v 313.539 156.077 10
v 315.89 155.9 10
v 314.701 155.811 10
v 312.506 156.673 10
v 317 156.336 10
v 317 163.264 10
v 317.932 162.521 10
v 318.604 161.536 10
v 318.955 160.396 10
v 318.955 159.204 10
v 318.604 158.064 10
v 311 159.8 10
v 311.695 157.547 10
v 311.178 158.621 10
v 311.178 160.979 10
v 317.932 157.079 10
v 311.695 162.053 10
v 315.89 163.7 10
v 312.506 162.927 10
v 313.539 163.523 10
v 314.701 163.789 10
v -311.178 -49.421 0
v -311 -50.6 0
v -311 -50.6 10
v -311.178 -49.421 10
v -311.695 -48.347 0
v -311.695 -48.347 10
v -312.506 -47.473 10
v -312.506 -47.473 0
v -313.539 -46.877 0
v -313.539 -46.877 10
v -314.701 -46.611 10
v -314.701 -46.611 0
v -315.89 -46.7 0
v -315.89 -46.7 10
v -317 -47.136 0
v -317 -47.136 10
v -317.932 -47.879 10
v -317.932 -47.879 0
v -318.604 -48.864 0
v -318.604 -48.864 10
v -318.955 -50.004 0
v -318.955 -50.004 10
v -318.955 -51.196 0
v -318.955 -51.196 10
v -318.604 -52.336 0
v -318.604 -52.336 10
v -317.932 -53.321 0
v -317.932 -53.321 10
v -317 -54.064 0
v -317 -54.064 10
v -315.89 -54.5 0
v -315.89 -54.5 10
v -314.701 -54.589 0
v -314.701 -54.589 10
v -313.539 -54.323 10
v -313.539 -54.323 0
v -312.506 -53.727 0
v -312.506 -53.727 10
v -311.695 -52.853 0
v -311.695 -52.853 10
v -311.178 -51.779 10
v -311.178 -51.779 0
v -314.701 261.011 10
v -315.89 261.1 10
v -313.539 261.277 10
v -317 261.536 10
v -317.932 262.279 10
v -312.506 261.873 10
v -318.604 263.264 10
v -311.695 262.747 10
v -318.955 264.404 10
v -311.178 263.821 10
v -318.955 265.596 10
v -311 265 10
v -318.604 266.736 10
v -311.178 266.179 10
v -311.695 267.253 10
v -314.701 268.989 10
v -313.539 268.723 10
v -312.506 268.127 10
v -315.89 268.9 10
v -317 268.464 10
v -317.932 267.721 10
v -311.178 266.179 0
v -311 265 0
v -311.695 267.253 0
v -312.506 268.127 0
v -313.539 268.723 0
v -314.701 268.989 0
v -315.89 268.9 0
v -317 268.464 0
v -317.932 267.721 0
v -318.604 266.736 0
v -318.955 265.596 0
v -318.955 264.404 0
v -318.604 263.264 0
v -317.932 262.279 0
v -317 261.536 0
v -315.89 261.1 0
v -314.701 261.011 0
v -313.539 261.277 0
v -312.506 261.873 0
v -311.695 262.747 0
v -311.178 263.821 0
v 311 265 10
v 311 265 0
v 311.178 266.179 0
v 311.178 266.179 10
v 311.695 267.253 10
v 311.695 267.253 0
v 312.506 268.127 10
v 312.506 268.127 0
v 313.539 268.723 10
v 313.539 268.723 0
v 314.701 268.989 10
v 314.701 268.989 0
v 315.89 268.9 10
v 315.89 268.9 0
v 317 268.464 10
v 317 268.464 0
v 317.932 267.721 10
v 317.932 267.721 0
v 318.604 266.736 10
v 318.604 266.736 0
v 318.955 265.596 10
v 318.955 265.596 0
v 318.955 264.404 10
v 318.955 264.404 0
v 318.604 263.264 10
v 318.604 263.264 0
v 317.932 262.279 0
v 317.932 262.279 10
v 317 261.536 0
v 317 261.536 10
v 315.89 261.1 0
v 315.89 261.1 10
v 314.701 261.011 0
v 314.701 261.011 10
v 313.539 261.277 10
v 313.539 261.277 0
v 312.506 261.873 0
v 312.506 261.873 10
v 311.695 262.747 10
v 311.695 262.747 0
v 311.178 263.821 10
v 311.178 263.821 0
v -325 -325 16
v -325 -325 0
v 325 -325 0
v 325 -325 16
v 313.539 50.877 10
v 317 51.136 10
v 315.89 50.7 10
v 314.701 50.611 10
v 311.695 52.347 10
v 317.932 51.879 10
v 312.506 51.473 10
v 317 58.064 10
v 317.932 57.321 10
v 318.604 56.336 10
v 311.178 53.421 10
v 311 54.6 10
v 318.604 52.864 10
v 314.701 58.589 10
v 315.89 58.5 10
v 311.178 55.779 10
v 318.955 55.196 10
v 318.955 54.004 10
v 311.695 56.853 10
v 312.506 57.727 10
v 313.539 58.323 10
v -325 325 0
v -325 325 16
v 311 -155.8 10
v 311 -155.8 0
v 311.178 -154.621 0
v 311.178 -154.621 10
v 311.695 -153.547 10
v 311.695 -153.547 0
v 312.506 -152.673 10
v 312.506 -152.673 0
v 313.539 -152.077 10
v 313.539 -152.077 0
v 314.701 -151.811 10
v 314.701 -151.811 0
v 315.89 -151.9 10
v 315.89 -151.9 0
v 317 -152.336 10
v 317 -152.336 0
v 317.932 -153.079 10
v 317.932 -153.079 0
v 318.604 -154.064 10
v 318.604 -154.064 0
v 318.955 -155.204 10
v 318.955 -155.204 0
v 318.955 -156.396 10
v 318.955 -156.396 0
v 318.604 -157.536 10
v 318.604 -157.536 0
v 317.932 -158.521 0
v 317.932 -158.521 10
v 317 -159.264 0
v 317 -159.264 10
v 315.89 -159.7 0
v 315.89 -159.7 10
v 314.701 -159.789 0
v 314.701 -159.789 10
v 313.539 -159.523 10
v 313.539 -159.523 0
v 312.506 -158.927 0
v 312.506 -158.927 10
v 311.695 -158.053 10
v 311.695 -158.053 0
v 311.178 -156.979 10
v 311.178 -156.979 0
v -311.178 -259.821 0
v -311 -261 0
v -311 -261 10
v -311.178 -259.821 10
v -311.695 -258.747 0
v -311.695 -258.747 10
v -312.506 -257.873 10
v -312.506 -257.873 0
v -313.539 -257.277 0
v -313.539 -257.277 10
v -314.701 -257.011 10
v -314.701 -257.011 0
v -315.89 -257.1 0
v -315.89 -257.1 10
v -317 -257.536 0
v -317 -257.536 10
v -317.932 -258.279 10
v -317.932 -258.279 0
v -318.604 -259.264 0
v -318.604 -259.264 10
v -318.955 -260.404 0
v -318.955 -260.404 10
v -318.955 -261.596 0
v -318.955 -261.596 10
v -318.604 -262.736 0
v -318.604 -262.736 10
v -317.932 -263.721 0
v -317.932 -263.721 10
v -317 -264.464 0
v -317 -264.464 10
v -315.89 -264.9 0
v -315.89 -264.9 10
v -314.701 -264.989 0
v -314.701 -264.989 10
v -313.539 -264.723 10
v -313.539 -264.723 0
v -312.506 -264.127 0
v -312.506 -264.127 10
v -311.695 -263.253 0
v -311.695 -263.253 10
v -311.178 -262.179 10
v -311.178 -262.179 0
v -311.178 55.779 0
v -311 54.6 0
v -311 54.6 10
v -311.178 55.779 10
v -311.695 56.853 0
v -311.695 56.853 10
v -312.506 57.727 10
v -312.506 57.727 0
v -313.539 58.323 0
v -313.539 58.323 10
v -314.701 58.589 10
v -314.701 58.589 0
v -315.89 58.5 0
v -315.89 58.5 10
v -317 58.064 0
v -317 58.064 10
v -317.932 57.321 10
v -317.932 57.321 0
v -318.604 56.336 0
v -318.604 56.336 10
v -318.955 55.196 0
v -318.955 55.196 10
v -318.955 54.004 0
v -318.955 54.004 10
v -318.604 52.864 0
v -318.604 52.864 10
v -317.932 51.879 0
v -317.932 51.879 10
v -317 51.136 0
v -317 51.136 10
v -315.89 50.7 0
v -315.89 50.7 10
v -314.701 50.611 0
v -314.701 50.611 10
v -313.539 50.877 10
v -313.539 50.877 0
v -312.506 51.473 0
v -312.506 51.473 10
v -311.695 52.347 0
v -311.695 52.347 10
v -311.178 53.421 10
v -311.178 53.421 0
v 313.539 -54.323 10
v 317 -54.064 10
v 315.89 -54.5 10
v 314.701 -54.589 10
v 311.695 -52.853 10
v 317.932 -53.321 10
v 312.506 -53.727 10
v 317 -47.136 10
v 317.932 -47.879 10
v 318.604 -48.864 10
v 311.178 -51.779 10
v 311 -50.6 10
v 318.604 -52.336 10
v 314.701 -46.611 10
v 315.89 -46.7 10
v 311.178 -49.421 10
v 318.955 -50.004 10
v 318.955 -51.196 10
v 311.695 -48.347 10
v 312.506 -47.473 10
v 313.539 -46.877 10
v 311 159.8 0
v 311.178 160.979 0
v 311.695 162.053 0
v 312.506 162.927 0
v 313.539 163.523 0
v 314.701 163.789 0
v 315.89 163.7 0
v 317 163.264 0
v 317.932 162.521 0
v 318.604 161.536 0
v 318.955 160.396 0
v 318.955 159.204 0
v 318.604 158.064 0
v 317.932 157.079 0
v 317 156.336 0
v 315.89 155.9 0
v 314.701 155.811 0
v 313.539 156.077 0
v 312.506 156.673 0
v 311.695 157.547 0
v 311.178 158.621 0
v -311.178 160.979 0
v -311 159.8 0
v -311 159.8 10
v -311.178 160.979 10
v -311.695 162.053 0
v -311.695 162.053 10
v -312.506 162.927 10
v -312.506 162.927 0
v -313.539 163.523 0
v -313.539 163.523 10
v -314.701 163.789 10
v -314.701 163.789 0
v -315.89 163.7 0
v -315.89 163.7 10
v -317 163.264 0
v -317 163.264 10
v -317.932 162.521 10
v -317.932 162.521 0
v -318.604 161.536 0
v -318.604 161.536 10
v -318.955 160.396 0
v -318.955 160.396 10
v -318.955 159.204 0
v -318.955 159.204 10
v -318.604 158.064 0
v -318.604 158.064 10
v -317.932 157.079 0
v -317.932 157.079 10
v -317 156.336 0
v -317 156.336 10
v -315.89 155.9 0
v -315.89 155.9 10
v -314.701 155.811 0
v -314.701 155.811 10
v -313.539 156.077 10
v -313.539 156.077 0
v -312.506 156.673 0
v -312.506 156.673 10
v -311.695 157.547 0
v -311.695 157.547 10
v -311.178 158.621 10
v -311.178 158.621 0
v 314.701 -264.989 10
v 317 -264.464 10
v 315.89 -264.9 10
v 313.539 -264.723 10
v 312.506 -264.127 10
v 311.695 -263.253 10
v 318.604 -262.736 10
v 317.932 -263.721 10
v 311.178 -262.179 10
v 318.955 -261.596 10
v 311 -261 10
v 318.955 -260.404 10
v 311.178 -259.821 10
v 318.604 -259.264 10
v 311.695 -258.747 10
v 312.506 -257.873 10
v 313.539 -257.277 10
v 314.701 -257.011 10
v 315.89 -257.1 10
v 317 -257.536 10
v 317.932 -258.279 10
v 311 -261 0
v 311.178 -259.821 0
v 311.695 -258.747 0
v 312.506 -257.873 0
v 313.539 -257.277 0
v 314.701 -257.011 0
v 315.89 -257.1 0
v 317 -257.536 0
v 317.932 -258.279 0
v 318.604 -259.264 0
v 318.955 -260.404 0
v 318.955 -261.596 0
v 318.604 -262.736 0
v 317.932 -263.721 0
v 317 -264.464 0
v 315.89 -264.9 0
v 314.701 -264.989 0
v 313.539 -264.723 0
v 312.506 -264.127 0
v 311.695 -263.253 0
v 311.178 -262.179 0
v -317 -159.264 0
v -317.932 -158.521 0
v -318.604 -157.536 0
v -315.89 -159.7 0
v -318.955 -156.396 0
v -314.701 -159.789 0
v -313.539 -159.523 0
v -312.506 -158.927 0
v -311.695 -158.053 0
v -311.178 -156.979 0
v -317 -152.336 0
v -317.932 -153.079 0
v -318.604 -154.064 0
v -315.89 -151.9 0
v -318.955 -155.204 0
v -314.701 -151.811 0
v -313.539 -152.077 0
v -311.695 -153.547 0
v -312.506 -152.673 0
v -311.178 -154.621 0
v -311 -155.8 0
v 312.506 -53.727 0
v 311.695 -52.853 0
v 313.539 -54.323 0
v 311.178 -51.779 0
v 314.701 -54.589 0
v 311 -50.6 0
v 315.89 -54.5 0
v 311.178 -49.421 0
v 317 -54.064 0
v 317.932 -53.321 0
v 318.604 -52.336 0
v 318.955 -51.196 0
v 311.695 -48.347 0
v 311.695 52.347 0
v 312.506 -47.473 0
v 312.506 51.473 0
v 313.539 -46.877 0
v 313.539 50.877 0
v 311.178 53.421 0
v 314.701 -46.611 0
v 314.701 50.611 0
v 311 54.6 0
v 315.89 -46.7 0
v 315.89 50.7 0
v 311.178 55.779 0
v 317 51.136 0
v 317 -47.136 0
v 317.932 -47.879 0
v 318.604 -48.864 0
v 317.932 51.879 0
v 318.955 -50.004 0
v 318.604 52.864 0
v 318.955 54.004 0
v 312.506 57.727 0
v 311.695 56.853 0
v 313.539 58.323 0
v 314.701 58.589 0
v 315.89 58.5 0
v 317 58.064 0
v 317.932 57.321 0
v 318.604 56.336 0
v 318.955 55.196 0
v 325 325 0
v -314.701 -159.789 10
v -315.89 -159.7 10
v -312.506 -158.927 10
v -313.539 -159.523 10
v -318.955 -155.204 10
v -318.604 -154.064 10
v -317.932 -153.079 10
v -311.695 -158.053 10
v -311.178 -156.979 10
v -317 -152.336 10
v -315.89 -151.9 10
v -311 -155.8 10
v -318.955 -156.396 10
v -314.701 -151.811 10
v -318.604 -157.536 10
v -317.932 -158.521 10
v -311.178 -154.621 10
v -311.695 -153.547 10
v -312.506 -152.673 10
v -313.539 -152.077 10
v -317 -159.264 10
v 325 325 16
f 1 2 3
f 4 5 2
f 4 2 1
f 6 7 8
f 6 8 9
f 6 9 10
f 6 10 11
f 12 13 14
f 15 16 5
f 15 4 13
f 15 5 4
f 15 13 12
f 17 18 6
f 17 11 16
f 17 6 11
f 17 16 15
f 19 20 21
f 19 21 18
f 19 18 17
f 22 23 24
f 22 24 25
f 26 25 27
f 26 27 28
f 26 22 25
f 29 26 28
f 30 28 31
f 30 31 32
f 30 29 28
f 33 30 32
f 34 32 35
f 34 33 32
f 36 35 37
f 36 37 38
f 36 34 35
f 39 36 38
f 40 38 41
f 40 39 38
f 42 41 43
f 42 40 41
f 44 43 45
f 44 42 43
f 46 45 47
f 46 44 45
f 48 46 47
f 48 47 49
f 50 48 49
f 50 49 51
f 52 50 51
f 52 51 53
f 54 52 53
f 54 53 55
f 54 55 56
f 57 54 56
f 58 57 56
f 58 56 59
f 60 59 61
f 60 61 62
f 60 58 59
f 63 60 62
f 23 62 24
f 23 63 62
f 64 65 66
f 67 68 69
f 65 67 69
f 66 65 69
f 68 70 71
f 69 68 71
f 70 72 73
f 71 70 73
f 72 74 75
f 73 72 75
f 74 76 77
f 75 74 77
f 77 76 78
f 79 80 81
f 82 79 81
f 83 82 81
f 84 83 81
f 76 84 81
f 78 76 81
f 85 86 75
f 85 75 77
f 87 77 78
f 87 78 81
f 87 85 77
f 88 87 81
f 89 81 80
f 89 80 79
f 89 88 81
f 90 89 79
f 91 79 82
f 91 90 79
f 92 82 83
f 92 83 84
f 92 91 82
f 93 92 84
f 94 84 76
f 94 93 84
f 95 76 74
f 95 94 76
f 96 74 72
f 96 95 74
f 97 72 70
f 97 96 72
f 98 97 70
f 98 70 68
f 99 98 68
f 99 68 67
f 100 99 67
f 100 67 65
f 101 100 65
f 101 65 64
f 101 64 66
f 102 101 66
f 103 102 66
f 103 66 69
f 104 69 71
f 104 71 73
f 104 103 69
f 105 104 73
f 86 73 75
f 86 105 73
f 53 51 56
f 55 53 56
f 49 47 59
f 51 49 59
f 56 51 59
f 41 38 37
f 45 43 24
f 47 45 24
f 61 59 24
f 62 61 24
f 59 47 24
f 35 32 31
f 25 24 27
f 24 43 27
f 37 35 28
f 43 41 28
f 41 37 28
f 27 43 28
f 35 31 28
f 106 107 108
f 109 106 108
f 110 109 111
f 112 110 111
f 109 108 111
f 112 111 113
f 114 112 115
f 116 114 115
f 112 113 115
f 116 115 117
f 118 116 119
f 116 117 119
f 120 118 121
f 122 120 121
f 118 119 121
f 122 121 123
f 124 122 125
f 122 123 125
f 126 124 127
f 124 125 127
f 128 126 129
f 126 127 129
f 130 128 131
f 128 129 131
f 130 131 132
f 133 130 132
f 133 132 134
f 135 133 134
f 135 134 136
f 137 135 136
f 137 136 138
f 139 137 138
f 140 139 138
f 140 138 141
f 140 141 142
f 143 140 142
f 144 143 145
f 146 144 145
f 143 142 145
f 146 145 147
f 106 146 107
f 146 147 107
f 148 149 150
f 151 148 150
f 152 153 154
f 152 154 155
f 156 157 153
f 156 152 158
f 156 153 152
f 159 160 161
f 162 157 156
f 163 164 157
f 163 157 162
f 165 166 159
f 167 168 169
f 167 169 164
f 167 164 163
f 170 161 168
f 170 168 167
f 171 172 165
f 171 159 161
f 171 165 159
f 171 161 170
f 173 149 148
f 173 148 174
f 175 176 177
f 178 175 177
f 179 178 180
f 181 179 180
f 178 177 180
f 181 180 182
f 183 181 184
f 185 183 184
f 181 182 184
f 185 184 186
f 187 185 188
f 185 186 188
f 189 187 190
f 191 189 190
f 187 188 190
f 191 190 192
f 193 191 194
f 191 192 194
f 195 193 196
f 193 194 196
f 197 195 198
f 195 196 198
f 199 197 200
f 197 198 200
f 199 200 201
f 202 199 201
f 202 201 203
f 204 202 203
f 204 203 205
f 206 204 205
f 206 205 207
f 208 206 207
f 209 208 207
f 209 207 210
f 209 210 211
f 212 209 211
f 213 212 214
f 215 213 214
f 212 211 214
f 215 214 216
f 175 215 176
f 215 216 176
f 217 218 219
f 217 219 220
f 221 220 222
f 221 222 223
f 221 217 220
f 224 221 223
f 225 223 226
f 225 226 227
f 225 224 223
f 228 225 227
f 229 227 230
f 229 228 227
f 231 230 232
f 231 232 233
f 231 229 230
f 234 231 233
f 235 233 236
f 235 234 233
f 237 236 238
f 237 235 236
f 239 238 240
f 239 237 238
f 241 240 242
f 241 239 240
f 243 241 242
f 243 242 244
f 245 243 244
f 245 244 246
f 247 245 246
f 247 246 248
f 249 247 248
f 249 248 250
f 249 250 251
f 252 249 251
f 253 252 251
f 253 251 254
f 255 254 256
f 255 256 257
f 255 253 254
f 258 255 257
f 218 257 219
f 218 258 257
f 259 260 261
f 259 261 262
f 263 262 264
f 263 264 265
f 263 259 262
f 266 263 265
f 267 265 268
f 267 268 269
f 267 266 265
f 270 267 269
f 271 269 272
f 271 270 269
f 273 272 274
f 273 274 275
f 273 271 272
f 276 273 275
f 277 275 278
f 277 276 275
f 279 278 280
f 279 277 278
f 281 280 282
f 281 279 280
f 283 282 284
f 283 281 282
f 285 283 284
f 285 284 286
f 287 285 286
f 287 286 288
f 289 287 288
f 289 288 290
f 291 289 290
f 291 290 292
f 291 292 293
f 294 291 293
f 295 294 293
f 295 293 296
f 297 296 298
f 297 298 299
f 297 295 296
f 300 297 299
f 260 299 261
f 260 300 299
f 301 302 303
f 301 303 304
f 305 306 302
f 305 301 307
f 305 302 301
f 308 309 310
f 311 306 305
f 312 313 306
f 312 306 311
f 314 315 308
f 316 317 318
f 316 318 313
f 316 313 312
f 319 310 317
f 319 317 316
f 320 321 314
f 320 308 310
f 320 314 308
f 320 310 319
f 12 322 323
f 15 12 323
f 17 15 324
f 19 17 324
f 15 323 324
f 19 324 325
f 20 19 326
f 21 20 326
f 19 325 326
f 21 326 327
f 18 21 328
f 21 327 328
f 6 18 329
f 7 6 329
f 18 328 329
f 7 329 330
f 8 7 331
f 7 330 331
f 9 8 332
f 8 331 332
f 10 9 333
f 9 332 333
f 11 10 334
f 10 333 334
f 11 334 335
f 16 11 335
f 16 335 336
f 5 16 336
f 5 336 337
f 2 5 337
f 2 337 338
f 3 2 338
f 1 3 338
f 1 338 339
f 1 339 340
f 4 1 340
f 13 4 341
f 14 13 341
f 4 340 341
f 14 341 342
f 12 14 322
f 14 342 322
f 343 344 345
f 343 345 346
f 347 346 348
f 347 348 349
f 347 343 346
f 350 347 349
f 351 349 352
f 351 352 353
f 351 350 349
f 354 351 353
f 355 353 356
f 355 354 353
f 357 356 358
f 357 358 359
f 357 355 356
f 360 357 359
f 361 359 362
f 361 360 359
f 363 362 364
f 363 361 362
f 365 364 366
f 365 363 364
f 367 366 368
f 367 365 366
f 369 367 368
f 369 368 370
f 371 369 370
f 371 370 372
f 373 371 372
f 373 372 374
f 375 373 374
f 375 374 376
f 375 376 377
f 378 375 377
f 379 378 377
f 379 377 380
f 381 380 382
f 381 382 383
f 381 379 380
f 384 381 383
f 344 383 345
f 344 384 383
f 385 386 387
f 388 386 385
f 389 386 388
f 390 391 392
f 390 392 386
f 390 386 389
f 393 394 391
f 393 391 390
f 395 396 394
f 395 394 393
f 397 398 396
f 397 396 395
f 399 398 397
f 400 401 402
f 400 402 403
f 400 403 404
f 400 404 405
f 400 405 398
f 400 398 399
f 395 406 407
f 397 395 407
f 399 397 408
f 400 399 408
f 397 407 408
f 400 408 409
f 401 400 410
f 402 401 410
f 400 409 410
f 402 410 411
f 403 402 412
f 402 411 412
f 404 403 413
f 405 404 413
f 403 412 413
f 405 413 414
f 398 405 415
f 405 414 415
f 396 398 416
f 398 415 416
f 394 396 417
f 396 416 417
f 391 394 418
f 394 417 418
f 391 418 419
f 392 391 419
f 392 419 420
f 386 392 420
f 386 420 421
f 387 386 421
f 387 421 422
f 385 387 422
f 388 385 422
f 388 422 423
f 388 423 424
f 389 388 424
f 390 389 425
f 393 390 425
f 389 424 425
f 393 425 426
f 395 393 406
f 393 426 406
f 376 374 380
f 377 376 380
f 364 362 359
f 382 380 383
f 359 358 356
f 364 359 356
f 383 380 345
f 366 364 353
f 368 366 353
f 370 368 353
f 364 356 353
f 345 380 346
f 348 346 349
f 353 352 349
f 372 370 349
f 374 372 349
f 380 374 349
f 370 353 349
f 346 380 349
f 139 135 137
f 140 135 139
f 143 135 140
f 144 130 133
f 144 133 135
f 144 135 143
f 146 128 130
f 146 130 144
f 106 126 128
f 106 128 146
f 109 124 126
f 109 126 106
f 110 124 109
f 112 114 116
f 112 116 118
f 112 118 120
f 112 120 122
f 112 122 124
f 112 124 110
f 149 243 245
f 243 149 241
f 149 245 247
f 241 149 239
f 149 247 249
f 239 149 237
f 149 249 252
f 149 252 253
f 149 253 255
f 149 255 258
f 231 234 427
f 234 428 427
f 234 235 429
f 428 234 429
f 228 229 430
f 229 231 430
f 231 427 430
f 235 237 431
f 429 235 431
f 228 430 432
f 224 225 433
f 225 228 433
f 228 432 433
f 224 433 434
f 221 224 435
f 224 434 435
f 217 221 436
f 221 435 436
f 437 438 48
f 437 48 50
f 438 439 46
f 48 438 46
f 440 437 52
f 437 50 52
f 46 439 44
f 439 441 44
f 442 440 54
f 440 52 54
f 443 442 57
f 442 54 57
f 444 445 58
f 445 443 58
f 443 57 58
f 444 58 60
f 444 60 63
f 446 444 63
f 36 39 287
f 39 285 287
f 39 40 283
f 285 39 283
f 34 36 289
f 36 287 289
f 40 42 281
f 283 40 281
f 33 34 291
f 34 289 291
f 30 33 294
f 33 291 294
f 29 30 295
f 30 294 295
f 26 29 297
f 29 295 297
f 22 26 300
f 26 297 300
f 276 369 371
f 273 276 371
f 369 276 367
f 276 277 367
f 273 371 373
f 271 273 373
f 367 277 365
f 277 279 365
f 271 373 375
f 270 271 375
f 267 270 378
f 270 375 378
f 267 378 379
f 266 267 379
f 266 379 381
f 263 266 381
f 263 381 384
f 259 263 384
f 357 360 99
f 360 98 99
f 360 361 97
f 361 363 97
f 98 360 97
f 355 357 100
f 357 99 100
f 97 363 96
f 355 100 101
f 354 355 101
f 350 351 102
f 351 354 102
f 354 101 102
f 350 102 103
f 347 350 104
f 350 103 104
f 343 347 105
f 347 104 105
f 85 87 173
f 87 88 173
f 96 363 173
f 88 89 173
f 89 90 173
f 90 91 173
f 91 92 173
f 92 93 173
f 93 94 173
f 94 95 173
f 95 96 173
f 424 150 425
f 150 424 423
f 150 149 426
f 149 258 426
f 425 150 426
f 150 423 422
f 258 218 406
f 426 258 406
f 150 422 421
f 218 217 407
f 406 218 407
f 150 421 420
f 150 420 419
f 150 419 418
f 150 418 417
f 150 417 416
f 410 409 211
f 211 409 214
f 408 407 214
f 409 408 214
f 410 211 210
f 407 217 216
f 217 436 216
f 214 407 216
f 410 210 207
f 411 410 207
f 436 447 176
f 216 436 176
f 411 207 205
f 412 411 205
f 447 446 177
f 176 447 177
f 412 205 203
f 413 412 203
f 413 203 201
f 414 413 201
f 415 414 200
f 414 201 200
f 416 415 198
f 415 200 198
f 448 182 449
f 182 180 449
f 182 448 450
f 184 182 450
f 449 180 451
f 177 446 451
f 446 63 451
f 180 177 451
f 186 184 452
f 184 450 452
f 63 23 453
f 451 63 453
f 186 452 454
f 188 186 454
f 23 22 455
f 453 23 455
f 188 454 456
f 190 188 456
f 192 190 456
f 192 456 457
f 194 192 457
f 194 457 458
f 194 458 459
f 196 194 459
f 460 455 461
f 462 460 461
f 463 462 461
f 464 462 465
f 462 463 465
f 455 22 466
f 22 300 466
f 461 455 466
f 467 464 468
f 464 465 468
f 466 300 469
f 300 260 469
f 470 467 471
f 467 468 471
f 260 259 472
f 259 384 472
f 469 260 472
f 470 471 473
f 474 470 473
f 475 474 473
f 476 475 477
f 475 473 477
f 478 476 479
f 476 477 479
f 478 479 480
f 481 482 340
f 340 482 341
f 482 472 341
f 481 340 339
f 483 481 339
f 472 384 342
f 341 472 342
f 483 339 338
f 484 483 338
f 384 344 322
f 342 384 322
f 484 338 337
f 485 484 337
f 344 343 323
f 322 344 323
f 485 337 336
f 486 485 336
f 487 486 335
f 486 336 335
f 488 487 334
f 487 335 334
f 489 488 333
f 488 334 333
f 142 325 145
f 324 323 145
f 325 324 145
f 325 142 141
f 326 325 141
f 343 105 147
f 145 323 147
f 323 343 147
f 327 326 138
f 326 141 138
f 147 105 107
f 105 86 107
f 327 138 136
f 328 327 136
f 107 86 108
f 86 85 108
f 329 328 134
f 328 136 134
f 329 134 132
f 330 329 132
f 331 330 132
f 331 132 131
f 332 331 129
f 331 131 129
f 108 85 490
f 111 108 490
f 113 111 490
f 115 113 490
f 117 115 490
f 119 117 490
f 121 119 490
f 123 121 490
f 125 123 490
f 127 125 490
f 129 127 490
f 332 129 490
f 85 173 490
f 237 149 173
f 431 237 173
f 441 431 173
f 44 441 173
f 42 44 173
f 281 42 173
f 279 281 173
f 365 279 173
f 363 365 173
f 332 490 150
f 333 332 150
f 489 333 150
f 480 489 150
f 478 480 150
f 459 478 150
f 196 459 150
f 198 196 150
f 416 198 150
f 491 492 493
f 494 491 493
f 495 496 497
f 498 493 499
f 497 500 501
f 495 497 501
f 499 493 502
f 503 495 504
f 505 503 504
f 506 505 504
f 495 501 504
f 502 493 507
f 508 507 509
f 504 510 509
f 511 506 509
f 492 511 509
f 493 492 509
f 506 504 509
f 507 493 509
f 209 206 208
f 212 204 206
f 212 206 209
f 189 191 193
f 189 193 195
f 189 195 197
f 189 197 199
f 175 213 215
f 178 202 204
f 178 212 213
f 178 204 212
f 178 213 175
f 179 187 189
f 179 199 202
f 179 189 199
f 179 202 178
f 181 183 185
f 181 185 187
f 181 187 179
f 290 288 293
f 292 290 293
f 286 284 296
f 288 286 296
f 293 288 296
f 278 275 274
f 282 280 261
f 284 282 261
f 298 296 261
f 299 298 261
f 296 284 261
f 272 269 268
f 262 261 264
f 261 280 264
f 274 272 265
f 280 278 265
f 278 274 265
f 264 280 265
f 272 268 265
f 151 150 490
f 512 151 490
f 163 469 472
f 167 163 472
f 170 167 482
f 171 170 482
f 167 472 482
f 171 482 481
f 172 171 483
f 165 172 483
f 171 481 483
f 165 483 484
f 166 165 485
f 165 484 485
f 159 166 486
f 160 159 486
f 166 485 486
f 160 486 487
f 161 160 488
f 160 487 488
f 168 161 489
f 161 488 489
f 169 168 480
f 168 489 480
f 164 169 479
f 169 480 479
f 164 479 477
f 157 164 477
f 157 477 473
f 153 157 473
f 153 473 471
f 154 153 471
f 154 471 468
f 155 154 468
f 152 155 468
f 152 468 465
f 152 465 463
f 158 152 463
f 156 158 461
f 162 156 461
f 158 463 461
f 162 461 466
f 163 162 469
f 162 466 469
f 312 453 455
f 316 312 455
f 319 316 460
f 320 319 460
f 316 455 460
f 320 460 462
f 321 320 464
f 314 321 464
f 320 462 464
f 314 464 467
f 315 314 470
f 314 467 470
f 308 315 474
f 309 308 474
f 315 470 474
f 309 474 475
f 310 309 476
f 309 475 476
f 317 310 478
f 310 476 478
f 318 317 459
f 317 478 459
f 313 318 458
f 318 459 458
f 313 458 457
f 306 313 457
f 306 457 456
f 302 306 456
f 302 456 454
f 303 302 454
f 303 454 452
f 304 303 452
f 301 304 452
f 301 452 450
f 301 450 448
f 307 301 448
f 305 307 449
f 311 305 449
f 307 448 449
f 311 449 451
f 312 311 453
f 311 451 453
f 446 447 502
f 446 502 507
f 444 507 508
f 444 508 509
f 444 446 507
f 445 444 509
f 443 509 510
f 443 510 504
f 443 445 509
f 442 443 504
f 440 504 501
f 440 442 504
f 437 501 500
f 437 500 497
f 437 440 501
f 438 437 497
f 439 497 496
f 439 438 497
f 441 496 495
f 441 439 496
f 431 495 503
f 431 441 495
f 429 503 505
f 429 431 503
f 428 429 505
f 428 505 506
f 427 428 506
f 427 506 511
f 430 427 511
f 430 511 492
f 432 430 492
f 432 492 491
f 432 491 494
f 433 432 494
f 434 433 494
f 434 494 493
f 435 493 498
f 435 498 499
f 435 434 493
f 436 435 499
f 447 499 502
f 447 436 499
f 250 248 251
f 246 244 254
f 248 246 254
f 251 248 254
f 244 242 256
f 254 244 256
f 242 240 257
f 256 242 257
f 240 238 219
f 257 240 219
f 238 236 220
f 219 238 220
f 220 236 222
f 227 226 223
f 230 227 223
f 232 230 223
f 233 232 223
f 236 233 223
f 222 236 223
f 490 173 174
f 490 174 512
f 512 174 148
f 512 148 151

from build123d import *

# Parameters (mm, degrees)
F0_W     = 650
F0_H     = 650
F0_R     = 4
F1_DEPTH = 16
F2_DEPTH = 10


# Not quite as in the source:
# - a pattern or mirror of a feature is missing from the dataset's text; its kind, count and spacing are read off the source's solid


with BuildPart() as f1:
    # F0 (on Top) → F1 (new body)
    with BuildSketch(Plane.XY):
        Rectangle(F0_W, F0_H)
        with Locations((-315, -261)):
            Circle(F0_R, mode=Mode.SUBTRACT)
        with Locations((-315, -155.8)):
            Circle(F0_R, mode=Mode.SUBTRACT)
        with Locations((-315, -50.6)):
            Circle(F0_R, mode=Mode.SUBTRACT)
        with Locations((-315, 54.6)):
            Circle(F0_R, mode=Mode.SUBTRACT)
        with Locations((-315, 159.8)):
            Circle(F0_R, mode=Mode.SUBTRACT)
        with Locations((-315, 265)):
            Circle(F0_R, mode=Mode.SUBTRACT)
        with Locations((-315, 265)):
            Circle(F0_R)
        with Locations((-315, 159.8)):
            Circle(F0_R)
        with Locations((-315, 54.6)):
            Circle(F0_R)
        with Locations((-315, -50.6)):
            Circle(F0_R)
        with Locations((-315, -155.8)):
            Circle(F0_R)
        with Locations((-315, -261)):
            Circle(F0_R)
    extrude(amount=F1_DEPTH)

    # F0 (on Top) → F2 (cut)
    with BuildSketch(Plane.XY):
        with Locations((-315, 265)):
            Circle(F0_R)
        with Locations((-315, 159.8)):
            Circle(F0_R)
        with Locations((-315, 54.6)):
            Circle(F0_R)
        with Locations((-315, -50.6)):
            Circle(F0_R)
        with Locations((-315, -155.8)):
            Circle(F0_R)
        with Locations((-315, -261)):
            Circle(F0_R)
    f2 = extrude(amount=F2_DEPTH, mode=Mode.SUBTRACT)

    # F2_copies: F2 across plane
    add(f2.mirror(Plane(origin=(0, 0, 0), x_dir=(0, 0, 1), z_dir=(1, 0, 0))), mode=Mode.SUBTRACT)


solid = f1.part
